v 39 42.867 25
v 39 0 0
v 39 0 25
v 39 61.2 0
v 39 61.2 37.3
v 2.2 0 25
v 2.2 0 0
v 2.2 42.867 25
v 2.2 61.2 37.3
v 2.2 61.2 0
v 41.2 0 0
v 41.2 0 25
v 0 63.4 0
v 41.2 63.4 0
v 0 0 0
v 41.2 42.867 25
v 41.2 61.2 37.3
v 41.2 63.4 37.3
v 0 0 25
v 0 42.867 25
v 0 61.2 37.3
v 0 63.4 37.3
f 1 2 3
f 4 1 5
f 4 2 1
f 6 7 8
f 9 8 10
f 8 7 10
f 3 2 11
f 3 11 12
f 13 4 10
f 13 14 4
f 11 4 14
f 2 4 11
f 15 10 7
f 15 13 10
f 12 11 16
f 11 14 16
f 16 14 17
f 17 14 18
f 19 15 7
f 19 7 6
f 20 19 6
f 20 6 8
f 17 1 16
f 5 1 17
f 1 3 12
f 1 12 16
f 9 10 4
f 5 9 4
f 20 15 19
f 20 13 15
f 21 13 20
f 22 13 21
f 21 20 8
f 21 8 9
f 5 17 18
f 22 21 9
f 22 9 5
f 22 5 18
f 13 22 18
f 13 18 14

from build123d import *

# Parameters (mm, degrees)
BOSS_EXTRUDE1_DEPTH = 41.2
SKETCH4_W           = 36.8
SKETCH4_H           = 61.2
CUT_EXTRUDE1_DEPTH  = 10000


with BuildPart() as part:
    # Sketch2 → Boss-Extrude1 (new body)
    with BuildSketch(Plane(origin=(0, 0, 0), x_dir=(0, 0, -1), z_dir=(1, 0, 0))):
        Polygon((0, 0), (-25, 0), (-25, 42.867109497), (-37.3, 61.2), (-37.3, 63.4), (0, 63.4), align=None)
    extrude(amount=BOSS_EXTRUDE1_DEPTH)

    # Sketch4 → Cut-Extrude1 (cut)
    with BuildSketch(Plane.XY):
        with Locations((20.6, 30.6)):
            Rectangle(SKETCH4_W, SKETCH4_H)
    extrude(amount=CUT_EXTRUDE1_DEPTH, mode=Mode.SUBTRACT)


solid = part.part
